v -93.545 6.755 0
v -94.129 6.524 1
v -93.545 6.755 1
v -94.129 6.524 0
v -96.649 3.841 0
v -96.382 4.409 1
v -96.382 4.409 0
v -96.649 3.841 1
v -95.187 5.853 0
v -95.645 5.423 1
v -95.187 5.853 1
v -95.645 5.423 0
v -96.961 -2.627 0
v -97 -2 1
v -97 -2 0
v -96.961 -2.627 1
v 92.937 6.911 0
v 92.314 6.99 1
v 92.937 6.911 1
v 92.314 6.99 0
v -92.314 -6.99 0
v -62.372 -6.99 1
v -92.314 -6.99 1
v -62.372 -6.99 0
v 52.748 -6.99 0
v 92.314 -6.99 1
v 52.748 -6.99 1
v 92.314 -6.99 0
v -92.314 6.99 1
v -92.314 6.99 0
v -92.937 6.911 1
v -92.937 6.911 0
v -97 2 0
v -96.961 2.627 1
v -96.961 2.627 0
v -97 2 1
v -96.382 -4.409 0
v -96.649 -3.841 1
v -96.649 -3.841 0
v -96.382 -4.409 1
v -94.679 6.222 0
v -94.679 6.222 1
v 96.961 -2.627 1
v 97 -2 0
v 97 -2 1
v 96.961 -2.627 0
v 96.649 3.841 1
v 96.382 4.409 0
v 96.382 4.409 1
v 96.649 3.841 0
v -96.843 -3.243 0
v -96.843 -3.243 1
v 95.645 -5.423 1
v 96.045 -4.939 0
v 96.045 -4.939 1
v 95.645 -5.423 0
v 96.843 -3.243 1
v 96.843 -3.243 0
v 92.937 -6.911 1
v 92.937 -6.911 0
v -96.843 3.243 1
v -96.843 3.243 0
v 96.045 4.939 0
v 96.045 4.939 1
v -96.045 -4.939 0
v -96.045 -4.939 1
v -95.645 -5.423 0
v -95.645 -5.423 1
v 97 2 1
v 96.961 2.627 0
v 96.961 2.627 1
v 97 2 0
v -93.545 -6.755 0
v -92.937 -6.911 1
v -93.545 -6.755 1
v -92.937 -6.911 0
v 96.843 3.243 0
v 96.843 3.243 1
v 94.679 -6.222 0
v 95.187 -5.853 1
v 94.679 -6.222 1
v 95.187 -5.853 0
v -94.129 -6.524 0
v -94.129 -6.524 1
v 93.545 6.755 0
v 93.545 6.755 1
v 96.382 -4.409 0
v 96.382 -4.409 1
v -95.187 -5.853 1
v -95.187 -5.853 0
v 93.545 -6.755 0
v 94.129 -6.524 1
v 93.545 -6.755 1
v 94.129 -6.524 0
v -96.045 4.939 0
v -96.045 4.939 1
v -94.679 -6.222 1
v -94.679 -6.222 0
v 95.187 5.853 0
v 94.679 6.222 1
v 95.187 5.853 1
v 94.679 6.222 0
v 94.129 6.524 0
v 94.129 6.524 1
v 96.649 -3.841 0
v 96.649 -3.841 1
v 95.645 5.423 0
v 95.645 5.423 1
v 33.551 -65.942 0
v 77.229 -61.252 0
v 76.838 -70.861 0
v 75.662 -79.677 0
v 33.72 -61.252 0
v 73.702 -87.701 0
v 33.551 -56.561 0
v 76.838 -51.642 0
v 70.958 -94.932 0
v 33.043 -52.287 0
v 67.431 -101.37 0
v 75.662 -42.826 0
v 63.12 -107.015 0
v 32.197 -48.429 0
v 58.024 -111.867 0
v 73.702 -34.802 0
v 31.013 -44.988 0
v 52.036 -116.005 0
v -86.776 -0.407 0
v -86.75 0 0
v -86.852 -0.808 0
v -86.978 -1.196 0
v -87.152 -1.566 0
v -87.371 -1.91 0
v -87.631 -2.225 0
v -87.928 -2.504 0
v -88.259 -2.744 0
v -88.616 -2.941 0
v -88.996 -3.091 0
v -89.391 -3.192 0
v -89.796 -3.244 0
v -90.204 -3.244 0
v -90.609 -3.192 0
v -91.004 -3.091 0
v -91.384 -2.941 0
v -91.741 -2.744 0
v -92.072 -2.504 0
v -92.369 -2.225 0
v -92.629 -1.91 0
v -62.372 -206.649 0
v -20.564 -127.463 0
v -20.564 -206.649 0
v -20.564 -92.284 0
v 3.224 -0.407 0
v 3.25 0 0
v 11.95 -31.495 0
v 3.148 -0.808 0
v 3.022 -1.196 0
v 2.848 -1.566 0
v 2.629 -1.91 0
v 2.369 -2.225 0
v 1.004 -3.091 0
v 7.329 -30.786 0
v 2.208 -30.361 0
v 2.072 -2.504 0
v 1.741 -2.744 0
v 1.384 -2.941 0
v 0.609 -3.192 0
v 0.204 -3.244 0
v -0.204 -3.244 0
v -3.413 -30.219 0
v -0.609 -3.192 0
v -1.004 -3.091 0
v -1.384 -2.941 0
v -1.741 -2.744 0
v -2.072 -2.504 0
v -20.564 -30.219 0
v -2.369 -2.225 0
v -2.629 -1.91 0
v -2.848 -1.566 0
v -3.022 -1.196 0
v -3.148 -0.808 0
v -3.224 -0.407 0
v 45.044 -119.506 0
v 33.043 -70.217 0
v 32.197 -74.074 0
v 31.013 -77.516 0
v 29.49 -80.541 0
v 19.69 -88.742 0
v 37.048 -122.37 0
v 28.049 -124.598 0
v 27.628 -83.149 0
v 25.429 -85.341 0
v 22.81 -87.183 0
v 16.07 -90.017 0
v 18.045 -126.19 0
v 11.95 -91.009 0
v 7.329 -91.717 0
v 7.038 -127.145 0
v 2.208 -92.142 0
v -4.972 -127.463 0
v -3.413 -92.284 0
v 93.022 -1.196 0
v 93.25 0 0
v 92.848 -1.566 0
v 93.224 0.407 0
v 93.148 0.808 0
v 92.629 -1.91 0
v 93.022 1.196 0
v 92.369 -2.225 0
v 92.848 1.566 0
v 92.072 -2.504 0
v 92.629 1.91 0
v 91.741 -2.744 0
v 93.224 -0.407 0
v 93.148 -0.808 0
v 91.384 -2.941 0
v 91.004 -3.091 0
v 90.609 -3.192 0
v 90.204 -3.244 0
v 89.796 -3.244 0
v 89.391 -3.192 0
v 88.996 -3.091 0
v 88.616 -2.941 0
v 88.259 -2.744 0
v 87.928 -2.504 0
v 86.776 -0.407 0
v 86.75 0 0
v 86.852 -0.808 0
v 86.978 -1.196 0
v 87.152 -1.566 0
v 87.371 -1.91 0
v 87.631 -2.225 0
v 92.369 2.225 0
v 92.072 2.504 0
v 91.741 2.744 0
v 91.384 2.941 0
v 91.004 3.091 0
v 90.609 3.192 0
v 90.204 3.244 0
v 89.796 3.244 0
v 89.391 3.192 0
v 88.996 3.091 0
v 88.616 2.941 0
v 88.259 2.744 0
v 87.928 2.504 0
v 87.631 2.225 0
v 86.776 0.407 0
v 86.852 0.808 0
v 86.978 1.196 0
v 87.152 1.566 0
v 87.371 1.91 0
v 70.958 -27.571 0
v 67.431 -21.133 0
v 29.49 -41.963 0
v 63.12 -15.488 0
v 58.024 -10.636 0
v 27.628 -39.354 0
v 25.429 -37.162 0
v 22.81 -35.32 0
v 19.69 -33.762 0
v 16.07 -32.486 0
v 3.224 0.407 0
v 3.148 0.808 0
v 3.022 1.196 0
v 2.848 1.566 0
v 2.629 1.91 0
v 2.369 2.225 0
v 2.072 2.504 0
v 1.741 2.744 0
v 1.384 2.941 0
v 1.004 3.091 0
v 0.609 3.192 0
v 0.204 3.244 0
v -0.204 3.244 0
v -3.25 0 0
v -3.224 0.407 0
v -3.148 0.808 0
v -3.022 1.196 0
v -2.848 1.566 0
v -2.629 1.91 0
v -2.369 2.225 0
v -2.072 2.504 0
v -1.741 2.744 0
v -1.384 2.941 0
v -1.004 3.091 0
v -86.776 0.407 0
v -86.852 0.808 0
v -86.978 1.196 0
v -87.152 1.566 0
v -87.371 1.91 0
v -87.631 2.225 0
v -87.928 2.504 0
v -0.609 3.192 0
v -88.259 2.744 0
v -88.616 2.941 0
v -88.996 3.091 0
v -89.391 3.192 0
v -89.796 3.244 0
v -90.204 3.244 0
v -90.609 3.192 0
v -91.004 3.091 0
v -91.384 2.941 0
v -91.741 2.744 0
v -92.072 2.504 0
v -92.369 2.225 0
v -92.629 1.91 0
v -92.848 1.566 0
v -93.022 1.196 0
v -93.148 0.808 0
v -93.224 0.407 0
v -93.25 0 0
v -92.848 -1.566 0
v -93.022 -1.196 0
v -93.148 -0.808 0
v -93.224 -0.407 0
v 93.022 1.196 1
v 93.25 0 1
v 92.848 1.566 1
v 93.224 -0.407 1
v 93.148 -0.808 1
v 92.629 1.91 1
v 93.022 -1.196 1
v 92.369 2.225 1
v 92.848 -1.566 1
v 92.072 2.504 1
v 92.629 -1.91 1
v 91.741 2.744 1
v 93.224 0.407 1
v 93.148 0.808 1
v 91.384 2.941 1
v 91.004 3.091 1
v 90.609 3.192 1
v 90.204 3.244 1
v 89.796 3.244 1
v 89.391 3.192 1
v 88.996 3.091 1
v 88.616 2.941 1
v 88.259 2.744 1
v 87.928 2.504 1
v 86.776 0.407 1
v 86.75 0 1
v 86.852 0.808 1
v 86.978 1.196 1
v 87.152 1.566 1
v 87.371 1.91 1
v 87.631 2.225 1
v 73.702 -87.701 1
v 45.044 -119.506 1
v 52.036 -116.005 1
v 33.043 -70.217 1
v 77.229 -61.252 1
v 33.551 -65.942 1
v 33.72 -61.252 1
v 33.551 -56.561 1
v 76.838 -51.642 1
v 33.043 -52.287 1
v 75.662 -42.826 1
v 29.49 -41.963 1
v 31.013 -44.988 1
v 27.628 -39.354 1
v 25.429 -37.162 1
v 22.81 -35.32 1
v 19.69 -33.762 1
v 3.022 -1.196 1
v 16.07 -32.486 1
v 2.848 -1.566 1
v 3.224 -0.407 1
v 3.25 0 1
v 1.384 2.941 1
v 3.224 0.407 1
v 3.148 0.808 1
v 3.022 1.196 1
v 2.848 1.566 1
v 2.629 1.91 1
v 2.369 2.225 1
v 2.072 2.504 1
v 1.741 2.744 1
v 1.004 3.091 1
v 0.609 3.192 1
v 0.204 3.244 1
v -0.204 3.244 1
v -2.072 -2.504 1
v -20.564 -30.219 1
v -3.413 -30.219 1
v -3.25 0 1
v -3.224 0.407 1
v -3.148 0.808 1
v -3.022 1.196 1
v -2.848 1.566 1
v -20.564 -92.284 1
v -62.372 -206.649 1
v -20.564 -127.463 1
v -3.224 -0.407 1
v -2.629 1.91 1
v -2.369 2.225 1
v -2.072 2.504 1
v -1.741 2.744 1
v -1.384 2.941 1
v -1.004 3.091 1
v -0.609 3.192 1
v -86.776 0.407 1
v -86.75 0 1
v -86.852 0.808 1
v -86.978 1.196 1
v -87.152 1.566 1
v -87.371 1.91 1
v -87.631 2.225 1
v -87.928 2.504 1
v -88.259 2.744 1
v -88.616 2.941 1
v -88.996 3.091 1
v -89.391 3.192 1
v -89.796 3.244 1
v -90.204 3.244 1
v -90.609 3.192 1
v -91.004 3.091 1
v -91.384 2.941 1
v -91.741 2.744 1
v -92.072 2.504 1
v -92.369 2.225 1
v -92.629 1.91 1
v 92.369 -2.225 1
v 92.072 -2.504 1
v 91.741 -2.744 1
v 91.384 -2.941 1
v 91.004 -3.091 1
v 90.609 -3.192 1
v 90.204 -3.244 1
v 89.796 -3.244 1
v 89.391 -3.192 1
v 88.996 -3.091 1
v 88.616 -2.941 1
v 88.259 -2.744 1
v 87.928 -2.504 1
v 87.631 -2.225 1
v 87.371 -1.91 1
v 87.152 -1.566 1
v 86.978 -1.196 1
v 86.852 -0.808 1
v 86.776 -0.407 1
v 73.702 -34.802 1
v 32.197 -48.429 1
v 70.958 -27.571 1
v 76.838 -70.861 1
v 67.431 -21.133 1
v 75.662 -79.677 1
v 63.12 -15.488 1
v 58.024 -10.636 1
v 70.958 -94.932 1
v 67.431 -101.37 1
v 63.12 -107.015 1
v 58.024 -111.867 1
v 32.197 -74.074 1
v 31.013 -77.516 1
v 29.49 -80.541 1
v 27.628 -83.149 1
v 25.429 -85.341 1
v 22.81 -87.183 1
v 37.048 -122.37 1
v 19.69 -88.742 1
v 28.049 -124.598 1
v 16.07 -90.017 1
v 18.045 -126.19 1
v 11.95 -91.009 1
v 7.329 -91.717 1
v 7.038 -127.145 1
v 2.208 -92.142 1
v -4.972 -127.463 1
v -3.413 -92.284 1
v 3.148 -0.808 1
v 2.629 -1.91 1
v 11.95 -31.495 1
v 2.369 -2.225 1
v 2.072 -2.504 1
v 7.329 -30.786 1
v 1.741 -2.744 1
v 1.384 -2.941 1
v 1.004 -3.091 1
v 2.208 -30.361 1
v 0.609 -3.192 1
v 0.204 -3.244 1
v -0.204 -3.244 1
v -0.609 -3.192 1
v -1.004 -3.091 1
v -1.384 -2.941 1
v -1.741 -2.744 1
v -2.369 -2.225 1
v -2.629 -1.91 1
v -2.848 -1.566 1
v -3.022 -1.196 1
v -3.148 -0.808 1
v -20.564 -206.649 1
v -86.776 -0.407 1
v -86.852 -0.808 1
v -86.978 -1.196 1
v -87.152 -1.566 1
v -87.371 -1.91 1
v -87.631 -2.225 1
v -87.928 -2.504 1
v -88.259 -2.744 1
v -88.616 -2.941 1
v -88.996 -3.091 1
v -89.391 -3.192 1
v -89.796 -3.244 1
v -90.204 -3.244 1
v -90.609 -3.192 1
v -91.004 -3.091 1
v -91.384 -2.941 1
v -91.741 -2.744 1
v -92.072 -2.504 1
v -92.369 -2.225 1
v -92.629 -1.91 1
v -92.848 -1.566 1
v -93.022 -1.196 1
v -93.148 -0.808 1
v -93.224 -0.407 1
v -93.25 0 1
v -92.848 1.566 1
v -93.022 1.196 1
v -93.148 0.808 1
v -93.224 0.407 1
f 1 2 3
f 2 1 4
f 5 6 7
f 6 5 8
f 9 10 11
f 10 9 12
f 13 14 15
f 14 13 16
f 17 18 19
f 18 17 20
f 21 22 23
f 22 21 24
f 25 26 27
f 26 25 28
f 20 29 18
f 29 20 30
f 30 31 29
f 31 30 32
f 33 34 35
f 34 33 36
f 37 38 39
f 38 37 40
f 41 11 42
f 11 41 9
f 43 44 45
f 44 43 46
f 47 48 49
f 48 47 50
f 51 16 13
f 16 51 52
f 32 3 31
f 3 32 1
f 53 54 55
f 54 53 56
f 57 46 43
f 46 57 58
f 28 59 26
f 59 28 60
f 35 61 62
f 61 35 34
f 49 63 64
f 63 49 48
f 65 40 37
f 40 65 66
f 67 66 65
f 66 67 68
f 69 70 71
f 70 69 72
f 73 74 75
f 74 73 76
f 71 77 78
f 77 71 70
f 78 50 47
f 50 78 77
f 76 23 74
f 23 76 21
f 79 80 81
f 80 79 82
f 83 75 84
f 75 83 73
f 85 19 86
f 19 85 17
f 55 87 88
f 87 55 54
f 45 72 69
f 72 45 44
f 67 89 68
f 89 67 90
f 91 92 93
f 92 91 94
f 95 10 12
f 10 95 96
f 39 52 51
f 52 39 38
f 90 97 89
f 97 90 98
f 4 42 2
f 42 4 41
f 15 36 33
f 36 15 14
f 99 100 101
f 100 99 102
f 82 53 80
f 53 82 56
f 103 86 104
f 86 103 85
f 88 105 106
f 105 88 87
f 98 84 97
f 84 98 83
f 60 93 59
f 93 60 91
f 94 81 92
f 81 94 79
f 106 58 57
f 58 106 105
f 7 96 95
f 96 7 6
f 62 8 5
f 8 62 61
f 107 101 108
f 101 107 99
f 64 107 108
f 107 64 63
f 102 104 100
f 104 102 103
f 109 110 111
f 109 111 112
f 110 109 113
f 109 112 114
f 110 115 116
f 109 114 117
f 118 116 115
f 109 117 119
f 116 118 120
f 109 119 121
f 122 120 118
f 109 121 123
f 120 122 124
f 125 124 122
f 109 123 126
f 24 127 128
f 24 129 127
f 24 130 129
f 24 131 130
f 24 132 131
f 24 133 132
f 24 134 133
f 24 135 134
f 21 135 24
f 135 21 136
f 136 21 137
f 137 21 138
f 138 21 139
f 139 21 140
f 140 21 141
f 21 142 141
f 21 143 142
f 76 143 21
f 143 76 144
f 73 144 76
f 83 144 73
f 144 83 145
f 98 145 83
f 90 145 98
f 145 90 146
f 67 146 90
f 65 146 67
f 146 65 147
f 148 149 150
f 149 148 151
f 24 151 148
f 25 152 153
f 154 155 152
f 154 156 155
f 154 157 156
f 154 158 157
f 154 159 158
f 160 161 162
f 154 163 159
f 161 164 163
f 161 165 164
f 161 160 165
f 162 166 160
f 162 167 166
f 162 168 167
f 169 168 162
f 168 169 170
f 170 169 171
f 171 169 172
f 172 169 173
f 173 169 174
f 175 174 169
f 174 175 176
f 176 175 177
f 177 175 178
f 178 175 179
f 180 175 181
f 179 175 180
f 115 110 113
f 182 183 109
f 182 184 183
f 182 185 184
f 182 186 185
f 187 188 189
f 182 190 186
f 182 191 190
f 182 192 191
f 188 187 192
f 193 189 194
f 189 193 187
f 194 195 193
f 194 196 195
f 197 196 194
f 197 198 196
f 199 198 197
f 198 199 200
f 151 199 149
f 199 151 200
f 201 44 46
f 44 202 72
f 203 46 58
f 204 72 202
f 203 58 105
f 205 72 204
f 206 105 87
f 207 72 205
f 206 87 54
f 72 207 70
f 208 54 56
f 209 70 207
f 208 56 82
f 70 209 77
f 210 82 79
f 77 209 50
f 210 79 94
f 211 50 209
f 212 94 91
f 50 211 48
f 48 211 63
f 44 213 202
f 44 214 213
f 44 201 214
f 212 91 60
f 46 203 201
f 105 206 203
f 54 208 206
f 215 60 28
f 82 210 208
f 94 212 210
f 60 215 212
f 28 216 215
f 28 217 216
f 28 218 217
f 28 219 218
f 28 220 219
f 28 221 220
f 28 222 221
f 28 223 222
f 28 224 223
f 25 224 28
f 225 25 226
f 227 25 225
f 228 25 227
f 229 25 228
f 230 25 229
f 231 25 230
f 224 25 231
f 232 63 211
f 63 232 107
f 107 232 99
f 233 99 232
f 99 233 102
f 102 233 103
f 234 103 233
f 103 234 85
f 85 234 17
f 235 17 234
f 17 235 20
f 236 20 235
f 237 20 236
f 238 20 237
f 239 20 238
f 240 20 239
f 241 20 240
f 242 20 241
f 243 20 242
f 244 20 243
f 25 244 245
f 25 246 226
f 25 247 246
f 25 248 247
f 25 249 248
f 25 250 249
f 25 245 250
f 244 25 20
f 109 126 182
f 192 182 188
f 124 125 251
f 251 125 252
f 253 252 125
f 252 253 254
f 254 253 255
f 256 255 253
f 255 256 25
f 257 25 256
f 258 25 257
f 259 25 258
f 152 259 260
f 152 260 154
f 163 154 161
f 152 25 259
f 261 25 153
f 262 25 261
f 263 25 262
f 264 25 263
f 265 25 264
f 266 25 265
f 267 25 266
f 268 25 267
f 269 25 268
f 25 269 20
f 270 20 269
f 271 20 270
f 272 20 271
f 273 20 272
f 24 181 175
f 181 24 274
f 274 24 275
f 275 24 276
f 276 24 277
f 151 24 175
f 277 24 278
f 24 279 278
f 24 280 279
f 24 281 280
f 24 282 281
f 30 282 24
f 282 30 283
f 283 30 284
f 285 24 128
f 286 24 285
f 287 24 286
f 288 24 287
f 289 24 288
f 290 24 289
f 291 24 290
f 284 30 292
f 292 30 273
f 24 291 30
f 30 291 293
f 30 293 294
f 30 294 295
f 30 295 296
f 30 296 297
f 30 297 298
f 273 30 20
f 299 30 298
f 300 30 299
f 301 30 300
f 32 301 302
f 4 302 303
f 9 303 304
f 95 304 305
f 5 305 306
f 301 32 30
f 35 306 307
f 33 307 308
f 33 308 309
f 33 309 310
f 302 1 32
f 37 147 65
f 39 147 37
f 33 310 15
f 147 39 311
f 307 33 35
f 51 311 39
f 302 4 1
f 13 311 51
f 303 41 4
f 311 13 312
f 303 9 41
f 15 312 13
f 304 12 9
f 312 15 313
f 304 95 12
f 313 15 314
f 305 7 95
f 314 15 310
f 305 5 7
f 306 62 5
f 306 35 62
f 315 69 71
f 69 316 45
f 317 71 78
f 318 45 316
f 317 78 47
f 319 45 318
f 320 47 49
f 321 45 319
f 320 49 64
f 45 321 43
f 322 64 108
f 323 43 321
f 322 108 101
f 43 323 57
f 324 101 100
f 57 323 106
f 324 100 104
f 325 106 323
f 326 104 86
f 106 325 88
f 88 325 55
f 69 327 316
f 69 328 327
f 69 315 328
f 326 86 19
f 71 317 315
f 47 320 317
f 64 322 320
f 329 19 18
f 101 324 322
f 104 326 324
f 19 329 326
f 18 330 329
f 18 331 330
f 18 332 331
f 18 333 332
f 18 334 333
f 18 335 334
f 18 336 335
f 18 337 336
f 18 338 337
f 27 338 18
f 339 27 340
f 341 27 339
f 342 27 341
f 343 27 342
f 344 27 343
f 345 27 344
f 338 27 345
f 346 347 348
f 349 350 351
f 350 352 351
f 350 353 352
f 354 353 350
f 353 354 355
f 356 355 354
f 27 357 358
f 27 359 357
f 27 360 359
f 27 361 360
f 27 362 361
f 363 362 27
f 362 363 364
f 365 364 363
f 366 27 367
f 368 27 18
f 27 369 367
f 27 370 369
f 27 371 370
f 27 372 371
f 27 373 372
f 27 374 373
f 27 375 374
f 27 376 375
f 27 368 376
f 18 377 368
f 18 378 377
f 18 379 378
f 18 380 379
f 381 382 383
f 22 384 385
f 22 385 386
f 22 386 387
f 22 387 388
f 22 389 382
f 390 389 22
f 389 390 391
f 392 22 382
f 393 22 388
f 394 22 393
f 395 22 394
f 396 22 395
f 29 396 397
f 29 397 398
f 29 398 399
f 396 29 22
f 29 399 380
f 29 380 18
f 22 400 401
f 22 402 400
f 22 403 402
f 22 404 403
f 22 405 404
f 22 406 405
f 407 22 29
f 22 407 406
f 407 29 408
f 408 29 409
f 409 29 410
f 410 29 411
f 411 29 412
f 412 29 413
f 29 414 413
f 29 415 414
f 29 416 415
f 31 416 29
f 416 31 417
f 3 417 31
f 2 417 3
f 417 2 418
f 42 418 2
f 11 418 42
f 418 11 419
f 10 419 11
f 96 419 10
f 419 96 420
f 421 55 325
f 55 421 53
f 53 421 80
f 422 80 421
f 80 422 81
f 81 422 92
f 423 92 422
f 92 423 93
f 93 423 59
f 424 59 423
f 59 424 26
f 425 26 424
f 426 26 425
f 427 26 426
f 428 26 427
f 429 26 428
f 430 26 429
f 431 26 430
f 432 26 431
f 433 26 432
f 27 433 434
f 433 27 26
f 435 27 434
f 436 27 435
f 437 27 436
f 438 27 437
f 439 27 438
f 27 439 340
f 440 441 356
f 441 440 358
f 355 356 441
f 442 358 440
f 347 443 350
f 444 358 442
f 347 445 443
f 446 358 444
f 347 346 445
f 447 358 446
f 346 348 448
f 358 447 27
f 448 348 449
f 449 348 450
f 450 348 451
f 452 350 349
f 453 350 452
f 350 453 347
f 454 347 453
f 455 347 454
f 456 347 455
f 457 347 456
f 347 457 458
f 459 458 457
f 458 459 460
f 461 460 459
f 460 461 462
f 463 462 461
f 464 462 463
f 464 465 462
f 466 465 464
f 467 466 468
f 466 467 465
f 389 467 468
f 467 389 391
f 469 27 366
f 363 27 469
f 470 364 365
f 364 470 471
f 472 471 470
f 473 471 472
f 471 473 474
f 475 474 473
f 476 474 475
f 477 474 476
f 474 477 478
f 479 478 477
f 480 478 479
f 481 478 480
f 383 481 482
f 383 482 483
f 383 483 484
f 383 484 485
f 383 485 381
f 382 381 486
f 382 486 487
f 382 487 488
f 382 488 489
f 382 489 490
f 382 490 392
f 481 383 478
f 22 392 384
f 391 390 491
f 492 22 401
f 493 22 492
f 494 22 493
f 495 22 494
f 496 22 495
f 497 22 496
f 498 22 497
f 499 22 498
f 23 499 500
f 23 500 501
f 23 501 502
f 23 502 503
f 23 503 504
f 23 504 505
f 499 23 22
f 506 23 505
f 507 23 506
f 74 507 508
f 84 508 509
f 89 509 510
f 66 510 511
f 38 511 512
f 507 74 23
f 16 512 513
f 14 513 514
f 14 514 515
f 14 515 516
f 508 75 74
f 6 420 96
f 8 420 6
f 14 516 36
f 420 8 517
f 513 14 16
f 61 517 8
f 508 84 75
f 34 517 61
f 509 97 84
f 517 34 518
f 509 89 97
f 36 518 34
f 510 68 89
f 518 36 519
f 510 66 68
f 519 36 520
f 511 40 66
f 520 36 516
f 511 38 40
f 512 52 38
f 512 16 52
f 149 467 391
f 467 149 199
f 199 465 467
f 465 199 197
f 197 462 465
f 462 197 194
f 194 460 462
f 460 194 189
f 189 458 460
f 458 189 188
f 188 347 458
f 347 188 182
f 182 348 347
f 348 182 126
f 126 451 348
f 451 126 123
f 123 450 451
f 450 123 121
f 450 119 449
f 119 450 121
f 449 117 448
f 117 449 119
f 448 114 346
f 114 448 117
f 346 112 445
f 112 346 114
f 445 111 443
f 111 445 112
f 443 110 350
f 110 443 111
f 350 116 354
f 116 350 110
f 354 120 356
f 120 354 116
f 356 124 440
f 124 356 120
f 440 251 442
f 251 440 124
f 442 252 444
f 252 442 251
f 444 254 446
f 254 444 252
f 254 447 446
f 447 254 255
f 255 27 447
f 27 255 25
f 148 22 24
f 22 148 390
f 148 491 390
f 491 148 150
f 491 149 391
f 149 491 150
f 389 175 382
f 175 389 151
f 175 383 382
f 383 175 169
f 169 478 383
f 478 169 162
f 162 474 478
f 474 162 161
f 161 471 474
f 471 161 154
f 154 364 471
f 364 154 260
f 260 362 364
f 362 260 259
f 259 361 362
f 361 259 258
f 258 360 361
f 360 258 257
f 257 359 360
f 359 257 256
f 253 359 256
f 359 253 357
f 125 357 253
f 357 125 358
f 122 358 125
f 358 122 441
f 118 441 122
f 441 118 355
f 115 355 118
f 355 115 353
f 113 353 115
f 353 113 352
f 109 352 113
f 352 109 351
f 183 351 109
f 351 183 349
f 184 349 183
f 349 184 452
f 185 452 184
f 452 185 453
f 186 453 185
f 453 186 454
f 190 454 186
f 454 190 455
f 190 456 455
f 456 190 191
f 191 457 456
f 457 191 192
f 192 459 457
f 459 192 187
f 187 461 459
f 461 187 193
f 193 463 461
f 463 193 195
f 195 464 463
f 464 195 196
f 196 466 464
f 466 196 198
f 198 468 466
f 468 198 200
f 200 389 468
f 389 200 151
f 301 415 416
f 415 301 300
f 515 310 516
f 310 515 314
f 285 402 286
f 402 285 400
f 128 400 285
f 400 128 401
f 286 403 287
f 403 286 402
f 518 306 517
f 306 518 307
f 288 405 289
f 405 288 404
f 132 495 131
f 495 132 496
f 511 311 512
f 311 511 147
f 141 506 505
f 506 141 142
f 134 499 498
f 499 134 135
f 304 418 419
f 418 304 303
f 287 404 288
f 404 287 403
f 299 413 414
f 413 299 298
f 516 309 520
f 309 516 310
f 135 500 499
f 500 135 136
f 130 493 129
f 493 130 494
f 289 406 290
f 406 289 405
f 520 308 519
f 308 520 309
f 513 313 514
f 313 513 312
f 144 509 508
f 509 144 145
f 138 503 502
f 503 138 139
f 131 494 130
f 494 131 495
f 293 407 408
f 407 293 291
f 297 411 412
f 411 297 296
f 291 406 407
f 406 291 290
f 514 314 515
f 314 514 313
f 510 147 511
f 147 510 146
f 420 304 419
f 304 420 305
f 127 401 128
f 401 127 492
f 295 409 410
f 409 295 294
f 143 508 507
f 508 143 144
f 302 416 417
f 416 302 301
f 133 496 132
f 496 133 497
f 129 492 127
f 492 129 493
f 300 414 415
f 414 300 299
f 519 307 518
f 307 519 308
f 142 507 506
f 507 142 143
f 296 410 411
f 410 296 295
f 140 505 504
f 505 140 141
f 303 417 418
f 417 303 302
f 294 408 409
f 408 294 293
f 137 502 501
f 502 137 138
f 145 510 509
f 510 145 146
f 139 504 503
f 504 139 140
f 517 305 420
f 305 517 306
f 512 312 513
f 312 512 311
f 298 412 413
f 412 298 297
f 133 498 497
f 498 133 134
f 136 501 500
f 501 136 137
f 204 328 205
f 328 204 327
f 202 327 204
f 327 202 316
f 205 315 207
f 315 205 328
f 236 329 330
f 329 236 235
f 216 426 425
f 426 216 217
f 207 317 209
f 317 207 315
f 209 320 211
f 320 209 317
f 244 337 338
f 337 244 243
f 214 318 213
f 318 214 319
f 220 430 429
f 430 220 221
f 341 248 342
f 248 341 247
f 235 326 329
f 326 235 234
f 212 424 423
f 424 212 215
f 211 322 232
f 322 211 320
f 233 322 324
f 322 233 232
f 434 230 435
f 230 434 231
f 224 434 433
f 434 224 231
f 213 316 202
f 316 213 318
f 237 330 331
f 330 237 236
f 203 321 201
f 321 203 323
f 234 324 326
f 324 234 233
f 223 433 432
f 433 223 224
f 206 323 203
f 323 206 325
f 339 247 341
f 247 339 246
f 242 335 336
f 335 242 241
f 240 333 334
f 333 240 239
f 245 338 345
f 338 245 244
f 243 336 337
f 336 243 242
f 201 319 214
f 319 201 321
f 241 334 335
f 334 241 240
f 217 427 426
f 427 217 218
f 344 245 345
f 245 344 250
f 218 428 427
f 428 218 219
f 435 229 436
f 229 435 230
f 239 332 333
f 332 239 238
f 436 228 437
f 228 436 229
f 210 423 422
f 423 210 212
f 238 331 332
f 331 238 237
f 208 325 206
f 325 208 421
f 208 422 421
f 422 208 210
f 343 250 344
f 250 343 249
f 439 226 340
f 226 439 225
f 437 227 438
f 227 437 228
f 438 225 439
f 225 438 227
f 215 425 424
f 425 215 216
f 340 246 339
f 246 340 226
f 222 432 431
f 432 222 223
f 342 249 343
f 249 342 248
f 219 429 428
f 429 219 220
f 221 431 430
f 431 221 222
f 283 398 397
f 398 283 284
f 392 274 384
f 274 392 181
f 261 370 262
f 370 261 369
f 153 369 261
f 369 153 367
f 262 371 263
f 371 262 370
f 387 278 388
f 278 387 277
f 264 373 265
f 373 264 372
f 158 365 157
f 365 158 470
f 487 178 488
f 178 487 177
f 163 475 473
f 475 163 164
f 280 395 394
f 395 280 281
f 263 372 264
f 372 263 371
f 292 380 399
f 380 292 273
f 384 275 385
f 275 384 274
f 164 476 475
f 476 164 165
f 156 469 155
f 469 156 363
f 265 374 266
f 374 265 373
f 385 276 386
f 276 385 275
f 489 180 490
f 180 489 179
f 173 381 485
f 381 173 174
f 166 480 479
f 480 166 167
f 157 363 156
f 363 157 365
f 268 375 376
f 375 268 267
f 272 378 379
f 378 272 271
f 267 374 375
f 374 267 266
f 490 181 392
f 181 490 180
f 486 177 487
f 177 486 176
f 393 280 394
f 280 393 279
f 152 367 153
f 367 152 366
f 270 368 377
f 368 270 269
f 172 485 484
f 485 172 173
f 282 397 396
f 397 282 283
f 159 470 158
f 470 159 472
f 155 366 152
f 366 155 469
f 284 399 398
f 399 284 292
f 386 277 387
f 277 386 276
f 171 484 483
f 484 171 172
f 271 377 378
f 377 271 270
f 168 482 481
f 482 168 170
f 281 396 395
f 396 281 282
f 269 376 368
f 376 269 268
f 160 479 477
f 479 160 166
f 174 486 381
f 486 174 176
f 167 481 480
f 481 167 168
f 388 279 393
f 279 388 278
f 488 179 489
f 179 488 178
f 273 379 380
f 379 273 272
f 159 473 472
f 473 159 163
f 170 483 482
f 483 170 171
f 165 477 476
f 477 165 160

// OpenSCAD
$fn = 50;


difference() {
	union() {
		translate(v = [0, 0, 0]) {
			rotate(a = [0, 0, 0]) {
				hull() {
					translate(v = [-92.0000000000, 2.0000000000, 0]) {
						rotate(a = [0, 0, 0]) {
							translate(v = [0, 0, 0]) {
								rotate(a = [0, 0, 0]) {
									cylinder(h = 1, r = 5);
								}
							}
						}
					}
					translate(v = [92.0000000000, 2.0000000000, 0]) {
						rotate(a = [0, 0, 0]) {
							translate(v = [0, 0, 0]) {
								rotate(a = [0, 0, 0]) {
									cylinder(h = 1, r = 5);
								}
							}
						}
					}
					translate(v = [-92.0000000000, -2.0000000000, 0]) {
						rotate(a = [0, 0, 0]) {
							translate(v = [0, 0, 0]) {
								rotate(a = [0, 0, 0]) {
									cylinder(h = 1, r = 5);
								}
							}
						}
					}
					translate(v = [92.0000000000, -2.0000000000, 0]) {
						rotate(a = [0, 0, 0]) {
							translate(v = [0, 0, 0]) {
								rotate(a = [0, 0, 0]) {
									cylinder(h = 1, r = 5);
								}
							}
						}
					}
				}
			}
		}
		translate(v = [0, 0, 0]) {
			rotate(a = [0, 0, 0]) {
				linear_extrude(height = 1) {
					text(font = "DejaVu Sans Mono:style=Bold", halign = "center", size = 209.0000000000, text = "P", valign = "top");
				}
			}
		}
	}
	union() {
		translate(v = [-90.0000000000, 0.0000000000, -125.0000000000]) {
			rotate(a = [0, 0, 0]) {
				cylinder(h = 250, r = 3.2500000000);
			}
		}
		translate(v = [90.0000000000, 0.0000000000, -125.0000000000]) {
			rotate(a = [0, 0, 0]) {
				cylinder(h = 250, r = 3.2500000000);
			}
		}
		translate(v = [90.0000000000, 0.0000000000, -125.0000000000]) {
			rotate(a = [0, 0, 0]) {
				cylinder(h = 250, r = 3.2500000000);
			}
		}
		translate(v = [0, 0, -125.0000000000]) {
			rotate(a = [0, 0, 0]) {
				cylinder(h = 250, r = 3.2500000000);
			}
		}
	}
}
